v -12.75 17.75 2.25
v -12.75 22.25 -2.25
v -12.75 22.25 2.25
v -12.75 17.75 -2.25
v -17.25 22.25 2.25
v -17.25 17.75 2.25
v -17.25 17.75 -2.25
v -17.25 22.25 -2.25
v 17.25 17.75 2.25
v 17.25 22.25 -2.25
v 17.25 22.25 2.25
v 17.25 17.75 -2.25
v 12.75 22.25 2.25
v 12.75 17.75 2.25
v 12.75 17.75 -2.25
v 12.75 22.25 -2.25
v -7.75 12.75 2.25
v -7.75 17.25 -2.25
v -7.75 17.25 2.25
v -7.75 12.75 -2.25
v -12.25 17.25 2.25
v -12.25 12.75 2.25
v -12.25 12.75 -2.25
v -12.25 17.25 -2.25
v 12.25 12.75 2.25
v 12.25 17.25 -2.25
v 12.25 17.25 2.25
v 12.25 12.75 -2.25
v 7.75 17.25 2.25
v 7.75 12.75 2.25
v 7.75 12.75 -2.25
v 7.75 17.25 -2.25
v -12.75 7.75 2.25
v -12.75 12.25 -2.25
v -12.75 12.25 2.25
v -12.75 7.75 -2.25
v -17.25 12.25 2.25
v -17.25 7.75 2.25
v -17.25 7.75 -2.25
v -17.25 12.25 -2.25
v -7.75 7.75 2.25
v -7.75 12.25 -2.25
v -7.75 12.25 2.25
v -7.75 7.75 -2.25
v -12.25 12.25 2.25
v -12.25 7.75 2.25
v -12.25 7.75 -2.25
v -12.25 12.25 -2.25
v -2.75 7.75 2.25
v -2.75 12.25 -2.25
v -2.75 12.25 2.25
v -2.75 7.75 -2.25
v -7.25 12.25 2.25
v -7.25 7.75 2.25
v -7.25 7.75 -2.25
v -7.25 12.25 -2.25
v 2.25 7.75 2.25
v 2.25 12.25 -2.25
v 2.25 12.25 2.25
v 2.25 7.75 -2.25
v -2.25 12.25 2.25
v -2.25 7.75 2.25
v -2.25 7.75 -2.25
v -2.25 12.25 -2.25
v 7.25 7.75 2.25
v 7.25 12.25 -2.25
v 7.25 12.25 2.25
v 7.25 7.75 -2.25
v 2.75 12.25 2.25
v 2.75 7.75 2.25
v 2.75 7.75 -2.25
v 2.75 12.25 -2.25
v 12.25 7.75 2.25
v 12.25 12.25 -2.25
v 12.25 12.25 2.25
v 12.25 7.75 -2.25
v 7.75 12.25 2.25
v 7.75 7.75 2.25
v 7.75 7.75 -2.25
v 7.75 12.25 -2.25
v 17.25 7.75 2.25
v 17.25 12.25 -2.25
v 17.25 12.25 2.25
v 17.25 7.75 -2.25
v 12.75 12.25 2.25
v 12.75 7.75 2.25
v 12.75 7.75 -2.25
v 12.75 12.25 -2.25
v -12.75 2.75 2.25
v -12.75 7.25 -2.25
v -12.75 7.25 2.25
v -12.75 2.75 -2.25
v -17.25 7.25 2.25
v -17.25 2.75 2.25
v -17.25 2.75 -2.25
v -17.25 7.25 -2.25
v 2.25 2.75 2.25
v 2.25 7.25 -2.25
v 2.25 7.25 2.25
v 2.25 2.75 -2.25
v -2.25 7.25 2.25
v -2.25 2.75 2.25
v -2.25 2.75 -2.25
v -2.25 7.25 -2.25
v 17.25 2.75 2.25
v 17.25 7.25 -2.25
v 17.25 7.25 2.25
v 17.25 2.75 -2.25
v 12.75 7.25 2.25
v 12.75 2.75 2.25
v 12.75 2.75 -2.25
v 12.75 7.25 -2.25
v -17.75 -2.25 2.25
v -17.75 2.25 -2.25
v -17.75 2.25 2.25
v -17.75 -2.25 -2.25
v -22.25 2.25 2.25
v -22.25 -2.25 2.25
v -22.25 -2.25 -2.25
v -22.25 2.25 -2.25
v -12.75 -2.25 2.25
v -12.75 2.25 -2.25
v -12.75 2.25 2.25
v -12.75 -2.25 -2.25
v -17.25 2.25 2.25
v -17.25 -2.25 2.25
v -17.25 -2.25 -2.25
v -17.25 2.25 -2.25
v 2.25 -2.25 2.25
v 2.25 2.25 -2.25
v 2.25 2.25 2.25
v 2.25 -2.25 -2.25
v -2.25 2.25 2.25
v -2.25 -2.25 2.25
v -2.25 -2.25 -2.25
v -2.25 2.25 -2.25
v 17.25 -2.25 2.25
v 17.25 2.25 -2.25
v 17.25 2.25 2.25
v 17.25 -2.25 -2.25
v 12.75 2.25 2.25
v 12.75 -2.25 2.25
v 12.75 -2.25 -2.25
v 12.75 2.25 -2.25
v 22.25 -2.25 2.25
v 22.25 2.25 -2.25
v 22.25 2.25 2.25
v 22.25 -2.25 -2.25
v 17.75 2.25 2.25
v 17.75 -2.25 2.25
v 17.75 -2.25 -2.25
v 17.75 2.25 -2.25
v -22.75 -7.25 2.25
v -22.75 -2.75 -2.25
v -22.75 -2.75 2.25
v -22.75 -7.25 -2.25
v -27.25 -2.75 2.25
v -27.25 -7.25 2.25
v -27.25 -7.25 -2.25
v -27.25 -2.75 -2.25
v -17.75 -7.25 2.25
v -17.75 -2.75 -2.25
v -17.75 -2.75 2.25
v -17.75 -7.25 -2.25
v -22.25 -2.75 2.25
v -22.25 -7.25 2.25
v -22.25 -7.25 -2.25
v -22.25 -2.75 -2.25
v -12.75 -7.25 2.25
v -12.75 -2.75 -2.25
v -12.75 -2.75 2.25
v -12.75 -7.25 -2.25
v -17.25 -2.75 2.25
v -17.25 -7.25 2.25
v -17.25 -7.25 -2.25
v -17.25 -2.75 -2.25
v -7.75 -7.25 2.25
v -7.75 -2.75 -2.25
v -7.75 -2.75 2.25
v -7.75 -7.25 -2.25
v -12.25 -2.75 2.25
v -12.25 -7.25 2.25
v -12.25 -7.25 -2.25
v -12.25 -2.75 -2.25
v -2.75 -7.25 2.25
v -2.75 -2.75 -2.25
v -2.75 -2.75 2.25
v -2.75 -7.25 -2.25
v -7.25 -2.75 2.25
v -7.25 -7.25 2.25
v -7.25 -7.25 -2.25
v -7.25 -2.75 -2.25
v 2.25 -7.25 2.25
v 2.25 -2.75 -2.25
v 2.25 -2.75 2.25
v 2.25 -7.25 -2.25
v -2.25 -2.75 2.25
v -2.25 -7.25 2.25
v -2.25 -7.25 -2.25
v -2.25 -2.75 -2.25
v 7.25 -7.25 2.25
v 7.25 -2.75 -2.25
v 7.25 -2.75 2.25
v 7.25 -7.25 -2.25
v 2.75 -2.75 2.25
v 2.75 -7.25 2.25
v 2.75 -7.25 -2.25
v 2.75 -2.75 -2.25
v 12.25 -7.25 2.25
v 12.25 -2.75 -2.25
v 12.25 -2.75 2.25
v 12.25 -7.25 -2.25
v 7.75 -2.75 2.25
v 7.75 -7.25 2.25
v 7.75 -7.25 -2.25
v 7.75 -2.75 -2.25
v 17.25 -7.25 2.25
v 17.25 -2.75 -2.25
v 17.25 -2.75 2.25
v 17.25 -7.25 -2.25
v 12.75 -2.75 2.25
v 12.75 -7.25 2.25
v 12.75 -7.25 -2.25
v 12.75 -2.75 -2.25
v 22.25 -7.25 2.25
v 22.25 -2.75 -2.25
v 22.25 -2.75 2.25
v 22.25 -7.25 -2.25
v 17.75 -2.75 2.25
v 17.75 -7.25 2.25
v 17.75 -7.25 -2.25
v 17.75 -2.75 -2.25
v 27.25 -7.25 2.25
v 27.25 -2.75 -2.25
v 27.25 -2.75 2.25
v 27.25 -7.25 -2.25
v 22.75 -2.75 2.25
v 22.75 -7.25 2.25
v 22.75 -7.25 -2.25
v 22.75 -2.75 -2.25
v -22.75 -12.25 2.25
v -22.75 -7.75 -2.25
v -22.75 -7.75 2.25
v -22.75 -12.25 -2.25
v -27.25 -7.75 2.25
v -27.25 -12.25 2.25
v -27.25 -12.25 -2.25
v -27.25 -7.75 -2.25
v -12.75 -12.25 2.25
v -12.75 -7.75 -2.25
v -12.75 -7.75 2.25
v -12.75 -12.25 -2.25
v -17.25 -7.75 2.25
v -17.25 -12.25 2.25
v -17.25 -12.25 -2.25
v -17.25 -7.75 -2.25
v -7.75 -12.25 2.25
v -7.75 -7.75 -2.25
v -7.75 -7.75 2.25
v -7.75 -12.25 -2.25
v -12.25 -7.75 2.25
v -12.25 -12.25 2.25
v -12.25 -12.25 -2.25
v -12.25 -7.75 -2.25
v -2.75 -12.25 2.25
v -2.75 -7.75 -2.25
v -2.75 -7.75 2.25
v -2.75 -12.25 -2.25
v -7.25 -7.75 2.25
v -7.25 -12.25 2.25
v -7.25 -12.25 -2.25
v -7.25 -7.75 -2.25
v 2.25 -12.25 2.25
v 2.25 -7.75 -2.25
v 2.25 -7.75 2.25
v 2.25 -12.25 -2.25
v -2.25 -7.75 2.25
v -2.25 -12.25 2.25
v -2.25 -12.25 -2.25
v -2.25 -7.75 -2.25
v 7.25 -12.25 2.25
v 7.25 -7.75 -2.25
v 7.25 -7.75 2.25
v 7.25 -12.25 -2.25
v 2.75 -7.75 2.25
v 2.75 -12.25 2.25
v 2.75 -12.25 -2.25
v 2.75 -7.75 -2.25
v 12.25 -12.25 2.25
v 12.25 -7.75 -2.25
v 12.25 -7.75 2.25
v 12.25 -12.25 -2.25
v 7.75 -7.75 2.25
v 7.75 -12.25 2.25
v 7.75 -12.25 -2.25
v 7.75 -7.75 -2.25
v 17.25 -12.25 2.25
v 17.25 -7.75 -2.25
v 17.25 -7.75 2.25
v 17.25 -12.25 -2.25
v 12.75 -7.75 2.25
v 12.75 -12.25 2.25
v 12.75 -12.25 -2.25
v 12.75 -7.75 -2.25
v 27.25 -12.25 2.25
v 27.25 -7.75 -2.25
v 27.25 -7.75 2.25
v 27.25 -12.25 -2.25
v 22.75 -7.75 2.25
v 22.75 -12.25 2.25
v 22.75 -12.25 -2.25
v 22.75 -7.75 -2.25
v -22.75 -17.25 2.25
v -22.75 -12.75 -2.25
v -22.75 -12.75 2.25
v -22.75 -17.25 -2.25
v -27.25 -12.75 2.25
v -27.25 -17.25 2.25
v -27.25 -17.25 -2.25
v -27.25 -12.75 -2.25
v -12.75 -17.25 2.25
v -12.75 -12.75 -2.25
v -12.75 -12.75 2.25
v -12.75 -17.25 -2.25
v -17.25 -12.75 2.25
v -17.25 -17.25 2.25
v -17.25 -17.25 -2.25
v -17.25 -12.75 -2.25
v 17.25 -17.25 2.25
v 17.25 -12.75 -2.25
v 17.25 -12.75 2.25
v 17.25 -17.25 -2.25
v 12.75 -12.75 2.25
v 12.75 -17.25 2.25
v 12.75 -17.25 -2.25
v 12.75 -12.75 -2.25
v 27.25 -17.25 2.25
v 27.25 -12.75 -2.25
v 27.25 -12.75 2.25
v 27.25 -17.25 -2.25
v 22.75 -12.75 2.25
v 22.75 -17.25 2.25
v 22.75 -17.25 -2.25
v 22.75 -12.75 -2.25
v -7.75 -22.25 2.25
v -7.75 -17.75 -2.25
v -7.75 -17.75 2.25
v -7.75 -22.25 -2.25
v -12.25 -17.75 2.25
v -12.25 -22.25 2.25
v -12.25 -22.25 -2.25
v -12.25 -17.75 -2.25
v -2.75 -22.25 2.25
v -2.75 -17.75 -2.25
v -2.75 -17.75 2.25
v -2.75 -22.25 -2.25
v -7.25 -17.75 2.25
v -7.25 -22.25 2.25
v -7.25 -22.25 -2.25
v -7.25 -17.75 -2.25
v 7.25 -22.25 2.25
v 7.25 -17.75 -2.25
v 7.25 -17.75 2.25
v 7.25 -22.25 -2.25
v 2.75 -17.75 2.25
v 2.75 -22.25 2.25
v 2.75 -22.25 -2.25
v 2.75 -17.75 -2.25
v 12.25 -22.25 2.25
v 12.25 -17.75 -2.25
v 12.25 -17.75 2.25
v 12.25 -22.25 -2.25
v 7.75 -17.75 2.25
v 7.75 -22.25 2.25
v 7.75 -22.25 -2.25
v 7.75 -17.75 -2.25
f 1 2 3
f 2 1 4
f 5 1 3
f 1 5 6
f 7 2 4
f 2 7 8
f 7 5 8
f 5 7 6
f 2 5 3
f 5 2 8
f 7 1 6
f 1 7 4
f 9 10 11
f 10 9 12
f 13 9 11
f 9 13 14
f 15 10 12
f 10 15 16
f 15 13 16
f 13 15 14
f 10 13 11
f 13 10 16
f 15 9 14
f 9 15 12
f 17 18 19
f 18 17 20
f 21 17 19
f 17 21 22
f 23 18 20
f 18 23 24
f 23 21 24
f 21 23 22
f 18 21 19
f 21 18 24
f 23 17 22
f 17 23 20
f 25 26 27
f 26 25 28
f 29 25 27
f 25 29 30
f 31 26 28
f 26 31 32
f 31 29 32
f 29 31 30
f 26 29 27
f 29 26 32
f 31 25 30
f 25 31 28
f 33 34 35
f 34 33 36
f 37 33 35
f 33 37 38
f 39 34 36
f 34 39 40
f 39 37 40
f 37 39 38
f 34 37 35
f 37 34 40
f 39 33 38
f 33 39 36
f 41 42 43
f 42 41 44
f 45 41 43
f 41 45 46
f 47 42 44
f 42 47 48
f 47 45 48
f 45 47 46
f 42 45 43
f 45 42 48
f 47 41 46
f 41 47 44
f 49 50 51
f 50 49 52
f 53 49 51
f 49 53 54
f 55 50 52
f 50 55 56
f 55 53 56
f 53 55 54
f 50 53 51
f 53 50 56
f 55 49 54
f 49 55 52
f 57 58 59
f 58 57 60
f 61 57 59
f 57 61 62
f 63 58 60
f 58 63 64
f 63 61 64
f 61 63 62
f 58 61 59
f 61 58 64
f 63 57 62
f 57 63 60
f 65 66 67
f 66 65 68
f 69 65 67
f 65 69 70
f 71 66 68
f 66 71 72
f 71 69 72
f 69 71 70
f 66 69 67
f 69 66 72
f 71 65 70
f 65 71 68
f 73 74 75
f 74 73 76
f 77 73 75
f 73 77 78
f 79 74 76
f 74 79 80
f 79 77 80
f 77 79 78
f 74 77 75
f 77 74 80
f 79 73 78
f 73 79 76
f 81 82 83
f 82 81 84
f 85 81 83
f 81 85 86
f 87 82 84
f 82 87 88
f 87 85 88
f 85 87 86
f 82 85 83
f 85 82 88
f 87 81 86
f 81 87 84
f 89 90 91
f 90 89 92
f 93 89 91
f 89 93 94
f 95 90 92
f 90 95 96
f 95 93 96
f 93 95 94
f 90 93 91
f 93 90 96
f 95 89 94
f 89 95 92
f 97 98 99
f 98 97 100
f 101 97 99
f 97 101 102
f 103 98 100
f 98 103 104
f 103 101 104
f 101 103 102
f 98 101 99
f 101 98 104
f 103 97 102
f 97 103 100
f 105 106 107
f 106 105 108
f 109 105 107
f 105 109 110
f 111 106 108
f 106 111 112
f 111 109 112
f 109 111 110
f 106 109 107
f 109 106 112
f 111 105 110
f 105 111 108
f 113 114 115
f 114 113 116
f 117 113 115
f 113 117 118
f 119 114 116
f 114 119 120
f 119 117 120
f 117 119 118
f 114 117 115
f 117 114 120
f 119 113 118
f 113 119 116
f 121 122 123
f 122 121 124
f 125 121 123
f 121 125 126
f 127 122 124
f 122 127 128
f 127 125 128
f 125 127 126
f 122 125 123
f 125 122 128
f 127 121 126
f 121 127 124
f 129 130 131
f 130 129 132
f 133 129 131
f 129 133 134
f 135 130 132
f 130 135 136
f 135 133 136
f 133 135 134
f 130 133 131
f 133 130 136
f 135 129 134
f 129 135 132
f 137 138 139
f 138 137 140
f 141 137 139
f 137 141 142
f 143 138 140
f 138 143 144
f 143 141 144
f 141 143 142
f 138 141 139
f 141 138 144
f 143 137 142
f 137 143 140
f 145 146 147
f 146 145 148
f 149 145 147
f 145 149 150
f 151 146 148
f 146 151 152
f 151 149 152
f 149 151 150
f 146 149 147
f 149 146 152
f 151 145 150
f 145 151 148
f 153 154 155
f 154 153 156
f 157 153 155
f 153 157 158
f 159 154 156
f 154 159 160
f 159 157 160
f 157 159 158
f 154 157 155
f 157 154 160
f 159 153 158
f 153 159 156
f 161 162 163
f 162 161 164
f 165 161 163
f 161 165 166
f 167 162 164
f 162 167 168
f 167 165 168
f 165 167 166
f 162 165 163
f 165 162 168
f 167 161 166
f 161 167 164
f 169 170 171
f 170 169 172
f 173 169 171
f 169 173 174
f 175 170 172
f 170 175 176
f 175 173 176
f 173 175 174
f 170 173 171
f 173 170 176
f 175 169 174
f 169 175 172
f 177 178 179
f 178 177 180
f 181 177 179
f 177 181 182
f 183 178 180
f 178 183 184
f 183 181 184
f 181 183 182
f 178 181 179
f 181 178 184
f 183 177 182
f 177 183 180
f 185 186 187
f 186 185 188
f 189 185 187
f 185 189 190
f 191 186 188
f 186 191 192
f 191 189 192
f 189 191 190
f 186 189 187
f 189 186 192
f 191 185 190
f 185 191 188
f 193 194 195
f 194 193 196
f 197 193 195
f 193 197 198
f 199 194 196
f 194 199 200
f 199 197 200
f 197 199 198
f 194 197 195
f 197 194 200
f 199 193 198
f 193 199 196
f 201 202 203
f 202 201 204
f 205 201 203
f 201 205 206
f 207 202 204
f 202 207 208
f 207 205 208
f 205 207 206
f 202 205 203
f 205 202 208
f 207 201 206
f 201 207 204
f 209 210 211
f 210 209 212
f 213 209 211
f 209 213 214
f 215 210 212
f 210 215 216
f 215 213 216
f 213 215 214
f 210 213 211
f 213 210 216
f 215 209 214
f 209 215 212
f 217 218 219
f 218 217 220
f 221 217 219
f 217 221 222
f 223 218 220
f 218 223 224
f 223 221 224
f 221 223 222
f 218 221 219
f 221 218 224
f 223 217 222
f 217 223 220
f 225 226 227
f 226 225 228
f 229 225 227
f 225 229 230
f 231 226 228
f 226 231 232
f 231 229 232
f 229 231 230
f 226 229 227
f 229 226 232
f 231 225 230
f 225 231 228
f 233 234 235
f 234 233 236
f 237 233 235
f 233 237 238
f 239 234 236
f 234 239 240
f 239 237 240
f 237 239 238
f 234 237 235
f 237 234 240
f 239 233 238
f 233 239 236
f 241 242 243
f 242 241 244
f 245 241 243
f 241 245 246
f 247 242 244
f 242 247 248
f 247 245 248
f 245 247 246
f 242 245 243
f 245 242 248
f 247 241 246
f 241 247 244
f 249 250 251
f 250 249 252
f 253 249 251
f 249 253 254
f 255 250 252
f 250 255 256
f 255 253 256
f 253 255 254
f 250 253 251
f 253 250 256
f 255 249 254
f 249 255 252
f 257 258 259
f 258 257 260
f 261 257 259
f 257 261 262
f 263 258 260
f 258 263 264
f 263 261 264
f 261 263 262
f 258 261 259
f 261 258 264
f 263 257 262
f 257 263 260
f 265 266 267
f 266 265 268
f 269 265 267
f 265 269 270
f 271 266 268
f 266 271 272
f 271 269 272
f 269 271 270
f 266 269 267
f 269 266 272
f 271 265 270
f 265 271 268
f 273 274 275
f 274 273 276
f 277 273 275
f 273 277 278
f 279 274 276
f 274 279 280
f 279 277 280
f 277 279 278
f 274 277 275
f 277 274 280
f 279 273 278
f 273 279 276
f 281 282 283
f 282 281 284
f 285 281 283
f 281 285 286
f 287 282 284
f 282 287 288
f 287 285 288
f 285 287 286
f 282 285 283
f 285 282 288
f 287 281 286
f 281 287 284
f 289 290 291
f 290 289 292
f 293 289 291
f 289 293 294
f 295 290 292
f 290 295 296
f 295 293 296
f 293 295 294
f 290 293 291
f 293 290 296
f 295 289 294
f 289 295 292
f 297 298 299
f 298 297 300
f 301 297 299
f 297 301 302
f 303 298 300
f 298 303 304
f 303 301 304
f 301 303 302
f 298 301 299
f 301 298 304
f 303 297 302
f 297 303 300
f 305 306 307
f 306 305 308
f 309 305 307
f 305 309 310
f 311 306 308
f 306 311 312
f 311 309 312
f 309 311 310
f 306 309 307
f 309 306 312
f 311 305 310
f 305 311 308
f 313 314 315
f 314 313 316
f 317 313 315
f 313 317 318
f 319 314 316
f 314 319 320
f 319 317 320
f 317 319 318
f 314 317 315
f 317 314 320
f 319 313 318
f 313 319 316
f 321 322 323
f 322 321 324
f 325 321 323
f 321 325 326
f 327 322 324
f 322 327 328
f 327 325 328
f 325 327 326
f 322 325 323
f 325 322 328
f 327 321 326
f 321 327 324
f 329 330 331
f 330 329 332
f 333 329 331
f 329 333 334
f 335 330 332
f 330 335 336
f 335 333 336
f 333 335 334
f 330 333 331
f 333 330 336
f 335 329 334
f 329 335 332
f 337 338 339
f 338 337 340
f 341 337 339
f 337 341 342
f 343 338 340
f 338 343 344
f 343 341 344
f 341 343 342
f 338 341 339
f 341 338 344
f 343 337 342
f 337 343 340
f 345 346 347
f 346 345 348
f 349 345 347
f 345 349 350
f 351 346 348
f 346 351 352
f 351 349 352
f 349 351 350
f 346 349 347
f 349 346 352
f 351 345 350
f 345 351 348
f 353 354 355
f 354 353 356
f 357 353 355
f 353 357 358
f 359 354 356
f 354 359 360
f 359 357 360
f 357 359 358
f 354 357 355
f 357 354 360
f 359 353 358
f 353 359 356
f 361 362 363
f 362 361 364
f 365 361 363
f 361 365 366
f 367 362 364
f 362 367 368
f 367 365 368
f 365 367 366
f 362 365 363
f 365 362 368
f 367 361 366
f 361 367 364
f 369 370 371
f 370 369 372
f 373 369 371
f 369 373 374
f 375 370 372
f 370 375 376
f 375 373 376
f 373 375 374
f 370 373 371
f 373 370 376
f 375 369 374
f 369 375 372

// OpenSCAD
/*
2D Pixel Art
*/

/* [Draw] */

// Your art : each line starts with a '/';'*' makes a pixel;any other character is ignored
pixels="/__*_____*__/___*___*___/__*******__/__*__*__*__/_**__*__**_/***********/*_*******_*/*_*_____*_*/___**_**___"; 

/* [Dimensions] */

// mm per x unit
xUnit=5; // [0:100]

// mm per y unit
yUnit=5; // [0:100]

// mm per z unit
zUnit=5; // [0:100]

// percentage of overlap between pixels
overlap=-10; //[-100:100]

overlapFactor=1+overlap/100;
//pixelsDimension=[pixelsPerLines,rows]*1;


unitSize=[xUnit,yUnit,zUnit]*1;

newPixel(pixels,unitSize,overlapFactor,center=true);

module newPixel(pixels,unitSize,overlapFactor,center){
	
	lines = split(pixels,"/");
	size = [len(lines[0]),len(lines)];

	translate(center ? [unitSize[0]*(size[0]-1),unitSize[1]*(size[1]-1),0]*(center?-1/2:0) : unitSize/2)
	for (y=[0:size[1]-1]){
		for (x=[0:len(lines[y])-1]){
		
			if (lines[y][x]=="*"){
				translate([x*unitSize[0],(size[1]-y-1)*unitSize[1],0])	
				cube(unitSize*overlapFactor,center=true);
			}
		}
	}
}

function subString(theString,from,to)=
	to==0?"":str(subString(theString,from,to-1),theString[from+to]);

function splitInfo(positions,values)=
	[for (index = [0:len(positions)-1]) [positions[index],(positions[index+1]==undef?len(values):positions[index+1])-positions[index]-1] ];

function split(theString, splitChar)= 
	[ for (position = splitInfo(search(splitChar,theString, 0)[0],theString)) subString(theString,position[0],position[1])];
